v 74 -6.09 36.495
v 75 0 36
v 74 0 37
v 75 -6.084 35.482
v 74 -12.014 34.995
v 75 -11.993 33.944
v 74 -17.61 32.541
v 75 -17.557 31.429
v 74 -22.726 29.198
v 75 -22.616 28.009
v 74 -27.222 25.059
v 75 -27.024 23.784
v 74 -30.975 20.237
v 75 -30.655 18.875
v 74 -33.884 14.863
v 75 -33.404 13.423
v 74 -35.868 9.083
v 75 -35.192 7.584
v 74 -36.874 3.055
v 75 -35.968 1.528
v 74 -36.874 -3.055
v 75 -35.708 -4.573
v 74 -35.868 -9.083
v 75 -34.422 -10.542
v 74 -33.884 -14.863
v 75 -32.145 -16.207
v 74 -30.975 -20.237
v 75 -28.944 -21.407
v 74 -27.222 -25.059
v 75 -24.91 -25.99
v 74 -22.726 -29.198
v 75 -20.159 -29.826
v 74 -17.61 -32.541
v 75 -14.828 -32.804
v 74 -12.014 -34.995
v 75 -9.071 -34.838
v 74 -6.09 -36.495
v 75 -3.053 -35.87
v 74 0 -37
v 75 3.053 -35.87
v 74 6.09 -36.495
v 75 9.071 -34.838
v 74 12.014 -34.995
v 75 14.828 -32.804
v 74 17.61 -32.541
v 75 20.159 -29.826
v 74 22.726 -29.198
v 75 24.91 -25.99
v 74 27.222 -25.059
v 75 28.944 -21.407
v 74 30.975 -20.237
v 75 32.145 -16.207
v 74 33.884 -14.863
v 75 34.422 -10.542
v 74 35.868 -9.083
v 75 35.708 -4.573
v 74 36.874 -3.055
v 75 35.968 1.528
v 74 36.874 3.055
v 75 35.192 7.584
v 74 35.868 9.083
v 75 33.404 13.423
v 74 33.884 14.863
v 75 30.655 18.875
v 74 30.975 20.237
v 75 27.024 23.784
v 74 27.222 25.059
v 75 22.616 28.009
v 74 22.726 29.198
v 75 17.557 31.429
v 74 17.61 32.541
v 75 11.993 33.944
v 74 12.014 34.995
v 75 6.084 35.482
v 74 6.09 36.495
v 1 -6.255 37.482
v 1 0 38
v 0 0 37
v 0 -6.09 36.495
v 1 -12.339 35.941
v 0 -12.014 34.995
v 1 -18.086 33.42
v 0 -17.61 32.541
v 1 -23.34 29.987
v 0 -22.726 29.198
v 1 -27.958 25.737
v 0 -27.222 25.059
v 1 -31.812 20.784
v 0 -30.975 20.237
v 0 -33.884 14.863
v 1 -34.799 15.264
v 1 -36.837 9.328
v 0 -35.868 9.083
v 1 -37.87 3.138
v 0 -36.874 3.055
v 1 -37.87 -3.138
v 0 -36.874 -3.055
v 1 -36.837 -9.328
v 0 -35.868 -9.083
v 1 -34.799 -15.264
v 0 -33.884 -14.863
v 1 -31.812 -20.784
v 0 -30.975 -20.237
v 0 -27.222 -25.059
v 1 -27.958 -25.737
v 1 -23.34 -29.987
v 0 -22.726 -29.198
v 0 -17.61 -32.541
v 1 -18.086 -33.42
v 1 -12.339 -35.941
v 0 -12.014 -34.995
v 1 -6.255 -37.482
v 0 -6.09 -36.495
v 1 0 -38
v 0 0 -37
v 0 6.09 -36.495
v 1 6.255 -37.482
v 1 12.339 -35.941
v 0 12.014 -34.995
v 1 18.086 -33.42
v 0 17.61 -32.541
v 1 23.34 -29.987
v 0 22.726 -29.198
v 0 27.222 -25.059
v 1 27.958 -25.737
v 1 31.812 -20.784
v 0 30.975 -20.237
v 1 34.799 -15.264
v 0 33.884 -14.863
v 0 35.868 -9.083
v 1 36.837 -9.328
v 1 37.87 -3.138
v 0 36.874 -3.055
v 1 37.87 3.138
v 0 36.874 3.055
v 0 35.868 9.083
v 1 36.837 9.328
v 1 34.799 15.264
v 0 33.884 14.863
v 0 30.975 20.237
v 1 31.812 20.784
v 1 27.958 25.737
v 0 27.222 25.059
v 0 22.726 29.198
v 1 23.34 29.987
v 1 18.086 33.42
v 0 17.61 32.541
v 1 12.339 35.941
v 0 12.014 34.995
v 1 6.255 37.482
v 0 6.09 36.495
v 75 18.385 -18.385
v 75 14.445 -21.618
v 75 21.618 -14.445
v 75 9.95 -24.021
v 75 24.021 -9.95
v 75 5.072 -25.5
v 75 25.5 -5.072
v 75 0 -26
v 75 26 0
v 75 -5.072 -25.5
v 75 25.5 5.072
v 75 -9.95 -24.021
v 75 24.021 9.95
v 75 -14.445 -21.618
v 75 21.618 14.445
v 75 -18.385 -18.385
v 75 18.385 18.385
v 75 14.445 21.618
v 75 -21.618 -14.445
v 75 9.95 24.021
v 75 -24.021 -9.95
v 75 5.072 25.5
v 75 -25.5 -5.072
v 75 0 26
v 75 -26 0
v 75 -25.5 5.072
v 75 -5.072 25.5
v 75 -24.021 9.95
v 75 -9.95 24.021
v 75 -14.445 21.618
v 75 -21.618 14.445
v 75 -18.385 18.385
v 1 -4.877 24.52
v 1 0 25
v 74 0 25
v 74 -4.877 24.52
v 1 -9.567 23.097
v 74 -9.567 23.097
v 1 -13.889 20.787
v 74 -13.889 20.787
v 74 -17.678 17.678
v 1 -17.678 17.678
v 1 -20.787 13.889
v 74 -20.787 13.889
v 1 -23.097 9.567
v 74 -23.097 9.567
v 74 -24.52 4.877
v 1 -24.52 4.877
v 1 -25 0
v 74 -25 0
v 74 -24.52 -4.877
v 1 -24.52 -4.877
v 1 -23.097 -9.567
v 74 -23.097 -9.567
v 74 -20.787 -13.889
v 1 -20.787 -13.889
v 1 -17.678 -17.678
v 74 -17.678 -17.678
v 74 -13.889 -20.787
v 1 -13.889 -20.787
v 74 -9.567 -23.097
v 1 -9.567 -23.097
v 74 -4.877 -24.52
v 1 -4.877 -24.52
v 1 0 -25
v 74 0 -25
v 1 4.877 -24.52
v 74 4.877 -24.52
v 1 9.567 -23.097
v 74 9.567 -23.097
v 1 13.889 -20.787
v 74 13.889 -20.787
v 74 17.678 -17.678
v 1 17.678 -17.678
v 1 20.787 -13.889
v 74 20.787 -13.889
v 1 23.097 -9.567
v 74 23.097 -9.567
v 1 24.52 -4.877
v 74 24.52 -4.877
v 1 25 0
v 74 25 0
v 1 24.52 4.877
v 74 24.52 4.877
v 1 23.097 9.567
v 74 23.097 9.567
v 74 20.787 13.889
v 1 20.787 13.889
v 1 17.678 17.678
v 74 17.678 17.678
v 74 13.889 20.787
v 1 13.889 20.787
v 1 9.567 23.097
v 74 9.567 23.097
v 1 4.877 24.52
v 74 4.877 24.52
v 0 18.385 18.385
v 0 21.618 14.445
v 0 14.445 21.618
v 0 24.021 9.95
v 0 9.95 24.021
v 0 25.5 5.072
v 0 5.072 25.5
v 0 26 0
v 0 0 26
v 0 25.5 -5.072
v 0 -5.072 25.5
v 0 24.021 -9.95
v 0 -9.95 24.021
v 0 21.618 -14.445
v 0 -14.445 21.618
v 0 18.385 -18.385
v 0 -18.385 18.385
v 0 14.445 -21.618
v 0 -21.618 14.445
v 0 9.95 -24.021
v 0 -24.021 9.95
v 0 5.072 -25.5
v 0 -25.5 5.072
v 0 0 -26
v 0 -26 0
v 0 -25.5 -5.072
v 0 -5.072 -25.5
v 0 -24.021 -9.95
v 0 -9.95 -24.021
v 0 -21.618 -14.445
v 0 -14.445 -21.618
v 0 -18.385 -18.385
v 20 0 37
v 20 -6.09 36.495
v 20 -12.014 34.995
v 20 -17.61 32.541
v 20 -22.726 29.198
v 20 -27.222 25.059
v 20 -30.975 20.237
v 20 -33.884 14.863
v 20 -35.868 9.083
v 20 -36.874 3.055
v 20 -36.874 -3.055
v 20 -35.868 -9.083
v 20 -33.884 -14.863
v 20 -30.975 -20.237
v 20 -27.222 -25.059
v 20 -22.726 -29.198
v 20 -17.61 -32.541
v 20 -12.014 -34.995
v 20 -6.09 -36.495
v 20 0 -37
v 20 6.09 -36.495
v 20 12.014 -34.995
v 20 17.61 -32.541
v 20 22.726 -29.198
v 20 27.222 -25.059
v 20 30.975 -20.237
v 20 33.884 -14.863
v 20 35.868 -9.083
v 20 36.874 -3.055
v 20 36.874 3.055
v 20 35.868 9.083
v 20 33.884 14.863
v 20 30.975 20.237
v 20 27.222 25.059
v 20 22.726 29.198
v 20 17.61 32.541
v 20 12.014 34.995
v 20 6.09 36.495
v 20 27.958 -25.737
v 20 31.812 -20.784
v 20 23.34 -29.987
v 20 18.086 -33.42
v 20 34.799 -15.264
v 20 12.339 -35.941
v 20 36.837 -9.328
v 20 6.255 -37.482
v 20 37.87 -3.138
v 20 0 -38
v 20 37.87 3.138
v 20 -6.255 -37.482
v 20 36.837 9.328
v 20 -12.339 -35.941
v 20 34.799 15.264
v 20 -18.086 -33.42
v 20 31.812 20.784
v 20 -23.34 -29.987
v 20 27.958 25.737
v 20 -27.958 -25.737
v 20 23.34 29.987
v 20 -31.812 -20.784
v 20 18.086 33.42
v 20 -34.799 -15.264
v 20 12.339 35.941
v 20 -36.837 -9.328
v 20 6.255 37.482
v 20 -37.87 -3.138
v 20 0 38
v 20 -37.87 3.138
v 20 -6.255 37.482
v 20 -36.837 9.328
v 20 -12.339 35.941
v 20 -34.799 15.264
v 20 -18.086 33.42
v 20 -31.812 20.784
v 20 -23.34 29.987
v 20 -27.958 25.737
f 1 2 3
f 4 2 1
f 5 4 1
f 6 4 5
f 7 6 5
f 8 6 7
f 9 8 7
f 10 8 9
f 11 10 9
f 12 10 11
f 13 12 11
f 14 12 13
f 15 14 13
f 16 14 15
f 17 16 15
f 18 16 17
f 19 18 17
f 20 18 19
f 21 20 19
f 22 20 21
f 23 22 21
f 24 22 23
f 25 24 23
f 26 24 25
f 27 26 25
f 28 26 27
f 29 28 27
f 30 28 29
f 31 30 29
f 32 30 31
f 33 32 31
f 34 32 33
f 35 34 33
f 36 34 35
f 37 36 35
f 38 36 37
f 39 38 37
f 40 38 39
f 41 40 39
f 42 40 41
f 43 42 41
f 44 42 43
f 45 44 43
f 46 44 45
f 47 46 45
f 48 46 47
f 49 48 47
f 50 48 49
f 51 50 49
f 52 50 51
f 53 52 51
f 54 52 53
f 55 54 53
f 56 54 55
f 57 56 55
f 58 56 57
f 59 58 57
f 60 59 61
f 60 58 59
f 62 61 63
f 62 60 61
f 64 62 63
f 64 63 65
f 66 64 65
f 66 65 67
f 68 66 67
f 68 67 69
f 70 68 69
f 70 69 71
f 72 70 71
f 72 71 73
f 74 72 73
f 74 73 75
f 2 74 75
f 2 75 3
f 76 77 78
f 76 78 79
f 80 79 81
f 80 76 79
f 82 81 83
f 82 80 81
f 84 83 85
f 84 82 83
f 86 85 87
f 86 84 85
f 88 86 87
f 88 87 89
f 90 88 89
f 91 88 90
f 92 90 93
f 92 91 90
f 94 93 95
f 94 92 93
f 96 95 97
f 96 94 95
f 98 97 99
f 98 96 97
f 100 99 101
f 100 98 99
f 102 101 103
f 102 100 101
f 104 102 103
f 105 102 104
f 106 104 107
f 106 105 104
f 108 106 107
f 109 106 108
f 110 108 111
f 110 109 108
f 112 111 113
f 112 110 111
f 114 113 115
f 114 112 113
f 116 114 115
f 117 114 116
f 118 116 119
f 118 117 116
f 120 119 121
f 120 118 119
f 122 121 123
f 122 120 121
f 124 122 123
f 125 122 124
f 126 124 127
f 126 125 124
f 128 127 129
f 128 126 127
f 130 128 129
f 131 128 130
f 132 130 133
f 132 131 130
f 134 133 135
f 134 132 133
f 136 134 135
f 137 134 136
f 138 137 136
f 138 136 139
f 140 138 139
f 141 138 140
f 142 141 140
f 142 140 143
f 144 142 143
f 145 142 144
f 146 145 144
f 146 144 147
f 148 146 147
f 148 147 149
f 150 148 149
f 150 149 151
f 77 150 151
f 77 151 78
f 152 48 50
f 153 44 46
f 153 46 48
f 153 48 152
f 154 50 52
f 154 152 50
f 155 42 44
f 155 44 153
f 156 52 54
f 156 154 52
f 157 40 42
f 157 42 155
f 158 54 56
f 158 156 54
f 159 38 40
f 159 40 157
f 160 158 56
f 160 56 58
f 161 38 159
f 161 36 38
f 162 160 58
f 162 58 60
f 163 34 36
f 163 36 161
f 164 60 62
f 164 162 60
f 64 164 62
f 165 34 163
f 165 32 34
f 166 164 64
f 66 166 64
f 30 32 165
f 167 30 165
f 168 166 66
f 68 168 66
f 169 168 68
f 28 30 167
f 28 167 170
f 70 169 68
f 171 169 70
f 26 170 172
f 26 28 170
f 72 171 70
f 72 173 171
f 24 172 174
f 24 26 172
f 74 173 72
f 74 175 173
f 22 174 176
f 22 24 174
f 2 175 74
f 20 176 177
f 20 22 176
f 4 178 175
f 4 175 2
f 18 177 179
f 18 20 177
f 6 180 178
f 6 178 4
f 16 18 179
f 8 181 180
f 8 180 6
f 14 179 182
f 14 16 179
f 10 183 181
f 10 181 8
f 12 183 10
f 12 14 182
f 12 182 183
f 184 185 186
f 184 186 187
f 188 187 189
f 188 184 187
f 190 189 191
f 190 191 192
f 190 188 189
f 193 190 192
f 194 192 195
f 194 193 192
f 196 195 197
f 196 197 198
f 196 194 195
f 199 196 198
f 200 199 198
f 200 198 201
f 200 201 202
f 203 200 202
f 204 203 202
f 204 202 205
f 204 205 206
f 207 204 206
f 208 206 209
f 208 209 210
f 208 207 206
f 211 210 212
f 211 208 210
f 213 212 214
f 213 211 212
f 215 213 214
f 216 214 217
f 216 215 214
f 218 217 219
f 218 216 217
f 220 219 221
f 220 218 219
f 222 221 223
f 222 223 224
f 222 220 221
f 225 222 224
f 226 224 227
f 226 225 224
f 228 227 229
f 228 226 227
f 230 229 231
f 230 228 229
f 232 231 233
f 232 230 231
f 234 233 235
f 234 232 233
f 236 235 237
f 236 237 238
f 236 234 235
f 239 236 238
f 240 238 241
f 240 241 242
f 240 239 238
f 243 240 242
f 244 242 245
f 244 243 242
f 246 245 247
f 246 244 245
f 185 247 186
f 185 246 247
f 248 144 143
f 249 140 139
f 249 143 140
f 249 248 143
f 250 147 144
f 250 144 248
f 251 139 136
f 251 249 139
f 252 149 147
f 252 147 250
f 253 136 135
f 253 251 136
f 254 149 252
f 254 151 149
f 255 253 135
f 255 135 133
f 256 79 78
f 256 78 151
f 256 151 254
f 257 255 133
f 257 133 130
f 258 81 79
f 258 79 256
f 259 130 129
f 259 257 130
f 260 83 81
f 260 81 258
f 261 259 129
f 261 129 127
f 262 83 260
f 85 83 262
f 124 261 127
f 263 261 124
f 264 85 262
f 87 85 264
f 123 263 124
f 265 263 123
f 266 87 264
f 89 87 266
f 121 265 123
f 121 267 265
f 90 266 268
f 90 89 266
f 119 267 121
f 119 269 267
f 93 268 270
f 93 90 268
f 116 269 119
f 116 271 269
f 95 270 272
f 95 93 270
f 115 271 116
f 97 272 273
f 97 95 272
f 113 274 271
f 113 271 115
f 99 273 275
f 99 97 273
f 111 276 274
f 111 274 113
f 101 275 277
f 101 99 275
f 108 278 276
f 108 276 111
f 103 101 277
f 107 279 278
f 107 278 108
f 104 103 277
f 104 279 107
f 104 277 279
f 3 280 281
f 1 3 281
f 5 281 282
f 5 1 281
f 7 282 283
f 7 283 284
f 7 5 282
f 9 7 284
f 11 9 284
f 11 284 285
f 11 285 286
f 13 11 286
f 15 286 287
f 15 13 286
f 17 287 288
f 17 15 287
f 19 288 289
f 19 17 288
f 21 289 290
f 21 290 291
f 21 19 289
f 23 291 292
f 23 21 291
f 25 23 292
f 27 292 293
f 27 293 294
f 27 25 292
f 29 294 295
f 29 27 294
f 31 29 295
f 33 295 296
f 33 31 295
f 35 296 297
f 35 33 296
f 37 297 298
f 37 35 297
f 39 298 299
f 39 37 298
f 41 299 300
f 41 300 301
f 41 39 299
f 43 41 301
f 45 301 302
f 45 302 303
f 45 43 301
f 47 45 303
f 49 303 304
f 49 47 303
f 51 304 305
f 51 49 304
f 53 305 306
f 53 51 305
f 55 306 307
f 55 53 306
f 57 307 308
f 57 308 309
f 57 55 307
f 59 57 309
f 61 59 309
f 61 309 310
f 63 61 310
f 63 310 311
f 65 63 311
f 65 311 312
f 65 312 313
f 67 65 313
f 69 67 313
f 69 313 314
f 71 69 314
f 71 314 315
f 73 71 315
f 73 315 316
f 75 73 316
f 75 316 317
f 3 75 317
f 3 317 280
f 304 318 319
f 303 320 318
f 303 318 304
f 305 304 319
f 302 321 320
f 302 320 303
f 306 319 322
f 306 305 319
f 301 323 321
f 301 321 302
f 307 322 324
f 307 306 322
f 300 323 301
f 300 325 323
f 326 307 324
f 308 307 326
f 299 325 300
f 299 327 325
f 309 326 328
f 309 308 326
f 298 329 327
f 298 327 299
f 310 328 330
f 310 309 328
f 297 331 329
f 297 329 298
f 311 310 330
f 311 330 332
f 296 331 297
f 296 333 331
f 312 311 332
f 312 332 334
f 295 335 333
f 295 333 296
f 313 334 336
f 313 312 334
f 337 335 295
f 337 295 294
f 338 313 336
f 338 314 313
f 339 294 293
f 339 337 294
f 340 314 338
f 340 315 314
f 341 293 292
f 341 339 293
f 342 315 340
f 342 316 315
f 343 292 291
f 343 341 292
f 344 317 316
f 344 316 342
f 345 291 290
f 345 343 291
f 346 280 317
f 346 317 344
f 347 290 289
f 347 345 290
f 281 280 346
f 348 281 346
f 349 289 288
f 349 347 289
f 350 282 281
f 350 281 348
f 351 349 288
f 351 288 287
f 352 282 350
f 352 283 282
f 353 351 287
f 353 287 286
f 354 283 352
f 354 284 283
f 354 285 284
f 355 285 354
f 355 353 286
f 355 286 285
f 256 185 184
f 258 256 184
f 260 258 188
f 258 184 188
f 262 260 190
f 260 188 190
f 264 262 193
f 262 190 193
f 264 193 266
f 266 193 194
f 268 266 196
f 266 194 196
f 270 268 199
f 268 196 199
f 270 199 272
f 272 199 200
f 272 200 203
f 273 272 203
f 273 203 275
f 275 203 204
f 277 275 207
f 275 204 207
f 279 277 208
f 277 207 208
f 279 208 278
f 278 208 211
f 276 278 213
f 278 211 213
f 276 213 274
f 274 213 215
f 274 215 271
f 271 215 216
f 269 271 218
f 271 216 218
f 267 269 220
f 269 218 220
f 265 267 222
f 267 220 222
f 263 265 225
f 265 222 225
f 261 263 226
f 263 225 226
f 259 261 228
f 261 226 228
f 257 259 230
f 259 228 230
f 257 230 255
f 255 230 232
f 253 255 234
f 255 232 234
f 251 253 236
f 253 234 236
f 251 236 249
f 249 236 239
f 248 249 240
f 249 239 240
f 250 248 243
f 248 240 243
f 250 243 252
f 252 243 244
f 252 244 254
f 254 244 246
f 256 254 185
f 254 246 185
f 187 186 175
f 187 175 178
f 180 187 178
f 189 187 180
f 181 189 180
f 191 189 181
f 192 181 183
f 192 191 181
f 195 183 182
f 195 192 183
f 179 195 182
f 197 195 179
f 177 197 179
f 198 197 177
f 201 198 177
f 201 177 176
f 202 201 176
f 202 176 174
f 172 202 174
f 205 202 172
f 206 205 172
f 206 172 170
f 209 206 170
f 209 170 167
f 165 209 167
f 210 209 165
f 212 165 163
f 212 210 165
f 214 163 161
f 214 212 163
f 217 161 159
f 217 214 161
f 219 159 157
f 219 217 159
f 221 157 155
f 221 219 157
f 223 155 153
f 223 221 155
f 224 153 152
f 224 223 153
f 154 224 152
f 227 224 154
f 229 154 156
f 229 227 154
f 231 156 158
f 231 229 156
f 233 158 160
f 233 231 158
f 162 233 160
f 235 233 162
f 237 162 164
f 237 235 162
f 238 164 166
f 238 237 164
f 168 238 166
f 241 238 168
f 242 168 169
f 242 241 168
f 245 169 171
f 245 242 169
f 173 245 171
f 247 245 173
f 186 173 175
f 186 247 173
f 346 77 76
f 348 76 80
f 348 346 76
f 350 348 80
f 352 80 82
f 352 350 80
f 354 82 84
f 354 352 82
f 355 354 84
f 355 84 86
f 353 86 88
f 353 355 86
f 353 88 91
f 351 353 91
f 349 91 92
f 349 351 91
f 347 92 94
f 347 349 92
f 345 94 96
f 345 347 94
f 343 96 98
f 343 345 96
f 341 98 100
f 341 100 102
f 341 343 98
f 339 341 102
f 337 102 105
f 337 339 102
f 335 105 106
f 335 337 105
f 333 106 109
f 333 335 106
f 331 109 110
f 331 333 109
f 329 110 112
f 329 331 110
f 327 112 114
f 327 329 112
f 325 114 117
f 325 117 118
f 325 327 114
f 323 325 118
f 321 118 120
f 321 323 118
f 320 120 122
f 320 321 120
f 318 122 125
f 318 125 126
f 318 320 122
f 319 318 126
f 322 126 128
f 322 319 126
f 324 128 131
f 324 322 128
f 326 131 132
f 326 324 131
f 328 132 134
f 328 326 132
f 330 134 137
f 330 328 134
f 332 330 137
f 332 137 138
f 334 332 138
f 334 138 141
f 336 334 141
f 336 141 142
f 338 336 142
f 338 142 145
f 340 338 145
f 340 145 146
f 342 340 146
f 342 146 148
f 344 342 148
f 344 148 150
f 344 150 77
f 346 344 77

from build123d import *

# Parameters (mm, degrees)
CHAMFER_1_SIZE = 1


with BuildPart() as part:
    # 草图1 → 旋转1 (revolve)
    with BuildSketch(Plane.XY, mode=Mode.PRIVATE) as revolve_1_sk:
        Polygon((0, 25), (0, 38), (20, 38), (20, 37), (75, 37), (75, 25), align=None)
    revolve(revolve_1_sk.sketch.rotate(Axis((0, 0, 0), (1, 0, 0)), 90), axis=Axis((0, 0, 0), (1, 0, 0)))

    # 倒角1
    chamfer_1_edges = [part.edges().sort_by_distance(p)[0] for p in [
        (75, 0, -25),
        (75, 0, -37),
        (0, 0, -38),
        (0, 0, -25),
    ]]
    chamfer(chamfer_1_edges, length=CHAMFER_1_SIZE)


solid = part.part
